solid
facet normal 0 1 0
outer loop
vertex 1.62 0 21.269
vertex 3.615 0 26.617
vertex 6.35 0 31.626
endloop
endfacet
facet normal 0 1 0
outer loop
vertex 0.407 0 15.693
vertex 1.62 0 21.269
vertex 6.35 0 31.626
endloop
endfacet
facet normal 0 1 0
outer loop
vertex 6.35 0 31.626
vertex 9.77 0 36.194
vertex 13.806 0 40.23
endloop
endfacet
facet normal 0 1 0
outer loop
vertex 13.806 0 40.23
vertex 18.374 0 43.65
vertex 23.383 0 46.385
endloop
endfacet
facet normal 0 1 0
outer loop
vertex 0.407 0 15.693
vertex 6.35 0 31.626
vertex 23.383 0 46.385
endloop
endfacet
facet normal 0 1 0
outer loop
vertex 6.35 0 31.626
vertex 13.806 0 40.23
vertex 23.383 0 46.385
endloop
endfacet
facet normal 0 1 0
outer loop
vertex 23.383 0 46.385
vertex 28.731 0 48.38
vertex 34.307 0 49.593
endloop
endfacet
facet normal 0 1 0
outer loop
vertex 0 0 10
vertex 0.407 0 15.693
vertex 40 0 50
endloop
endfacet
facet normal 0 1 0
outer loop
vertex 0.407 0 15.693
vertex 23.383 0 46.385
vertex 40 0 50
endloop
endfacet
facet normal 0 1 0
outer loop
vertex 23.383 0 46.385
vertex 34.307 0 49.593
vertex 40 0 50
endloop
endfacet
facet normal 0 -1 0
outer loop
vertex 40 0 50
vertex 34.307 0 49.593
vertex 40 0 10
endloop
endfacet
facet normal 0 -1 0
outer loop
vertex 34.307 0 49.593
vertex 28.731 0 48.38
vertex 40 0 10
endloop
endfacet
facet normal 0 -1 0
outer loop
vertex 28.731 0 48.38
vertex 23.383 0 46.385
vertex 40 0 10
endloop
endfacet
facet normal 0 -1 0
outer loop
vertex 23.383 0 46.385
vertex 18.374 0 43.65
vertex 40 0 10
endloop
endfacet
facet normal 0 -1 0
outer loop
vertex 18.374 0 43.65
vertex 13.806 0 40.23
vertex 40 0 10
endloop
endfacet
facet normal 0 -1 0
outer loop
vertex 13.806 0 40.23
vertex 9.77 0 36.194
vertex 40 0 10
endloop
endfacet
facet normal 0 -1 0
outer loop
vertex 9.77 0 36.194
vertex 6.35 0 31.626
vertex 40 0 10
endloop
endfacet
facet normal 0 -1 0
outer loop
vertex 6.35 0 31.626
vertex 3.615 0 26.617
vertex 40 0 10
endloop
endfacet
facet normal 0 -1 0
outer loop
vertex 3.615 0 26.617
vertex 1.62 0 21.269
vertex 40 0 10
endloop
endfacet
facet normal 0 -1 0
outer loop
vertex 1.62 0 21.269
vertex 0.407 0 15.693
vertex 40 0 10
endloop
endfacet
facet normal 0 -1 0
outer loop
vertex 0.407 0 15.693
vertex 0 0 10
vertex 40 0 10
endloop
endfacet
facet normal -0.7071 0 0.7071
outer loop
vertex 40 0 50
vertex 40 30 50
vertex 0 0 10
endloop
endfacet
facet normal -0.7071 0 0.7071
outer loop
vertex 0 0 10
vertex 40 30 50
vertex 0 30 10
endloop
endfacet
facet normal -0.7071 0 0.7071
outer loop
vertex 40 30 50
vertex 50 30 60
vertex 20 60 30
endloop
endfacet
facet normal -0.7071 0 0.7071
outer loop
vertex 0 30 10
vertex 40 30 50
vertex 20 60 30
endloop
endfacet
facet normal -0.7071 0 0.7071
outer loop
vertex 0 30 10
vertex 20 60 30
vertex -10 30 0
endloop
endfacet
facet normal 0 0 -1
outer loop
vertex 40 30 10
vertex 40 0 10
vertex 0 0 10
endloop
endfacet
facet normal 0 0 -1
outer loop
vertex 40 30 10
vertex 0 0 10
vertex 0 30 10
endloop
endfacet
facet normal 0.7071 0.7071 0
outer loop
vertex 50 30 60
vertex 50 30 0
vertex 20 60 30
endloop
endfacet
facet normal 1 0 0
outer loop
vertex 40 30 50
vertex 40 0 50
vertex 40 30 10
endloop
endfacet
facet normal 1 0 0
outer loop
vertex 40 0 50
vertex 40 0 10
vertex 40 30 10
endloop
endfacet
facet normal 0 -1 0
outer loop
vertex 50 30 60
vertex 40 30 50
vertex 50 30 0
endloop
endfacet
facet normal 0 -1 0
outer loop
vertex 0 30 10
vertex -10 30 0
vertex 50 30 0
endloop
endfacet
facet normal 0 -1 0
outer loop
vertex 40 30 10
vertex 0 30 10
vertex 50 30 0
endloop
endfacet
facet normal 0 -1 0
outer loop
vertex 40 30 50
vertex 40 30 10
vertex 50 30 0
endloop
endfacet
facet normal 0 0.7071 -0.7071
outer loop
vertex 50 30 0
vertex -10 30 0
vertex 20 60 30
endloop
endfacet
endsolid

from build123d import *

# Parameters (mm, degrees)
SKETCH1_W           = 40
SKETCH1_H           = 30
BOSS_EXTRUDE2_DEPTH = 60
SKETCH3_W           = 10
SKETCH3_H           = 30
CUT_EXTRUDE1_DEPTH  = 60
CUT_EXTRUDE2_DEPTH  = 60
CUT_EXTRUDE3_DEPTH  = 60
CUT_EXTRUDE4_DEPTH  = 60
BOSS_EXTRUDE7_DEPTH = 0.0001


with BuildPart() as part:
    # Sketch1 → Boss-Extrude2 (new body)
    with BuildSketch(Plane.XY):
        Polygon((50, 30), (20, 60), (-10, 30), (0, 30), (40, 30), align=None)
        with Locations((20, 15)):
            Rectangle(SKETCH1_W, SKETCH1_H)
    extrude(amount=BOSS_EXTRUDE2_DEPTH)

    # Sketch3 → Cut-Extrude1 (cut)
    with BuildSketch(Plane(origin=(0, 0, 0), x_dir=(0, 0, -1), z_dir=(1, 0, 0))):
        Polygon((-30, 60), (0, 60), (0, 30), align=None)
        Polygon((-60, 30), (-60, 60), (-30, 60), align=None)
        with Locations((-5, 15)):
            Rectangle(SKETCH3_W, SKETCH3_H)
        with Locations((-55, 15)):
            Rectangle(SKETCH3_W, SKETCH3_H)
    extrude(amount=CUT_EXTRUDE1_DEPTH, mode=Mode.SUBTRACT)

    # Sketch4 → Cut-Extrude2 (cut)
    with BuildSketch(Plane(origin=(0, 0, 0), x_dir=(0, 0, -1), z_dir=(1, 0, 0))):
        Polygon((-60, 30), (-50, 40), (-60, 40), align=None)
    extrude(amount=-CUT_EXTRUDE2_DEPTH, mode=Mode.SUBTRACT)

    # Sketch5 → Cut-Extrude3 (cut)
    with BuildSketch(Plane(origin=(0, 0, 0), x_dir=(0, 0, -1), z_dir=(1, 0, 0))):
        Polygon((-10, 40), (0, 40), (0, 30), align=None)
    extrude(amount=-CUT_EXTRUDE3_DEPTH, mode=Mode.SUBTRACT)

    # Sketch6 → Cut-Extrude4 (cut)
    with BuildSketch(Plane(origin=(0, 60, 0), x_dir=(1, 0, 0), z_dir=(0, 1, 0))):
        Polygon((-10, 0), (-10, -60), (50, -60), align=None)
    extrude(amount=-CUT_EXTRUDE4_DEPTH, mode=Mode.SUBTRACT)

    # Sketch7 → Boss-Extrude7 (add)
    with BuildSketch(Plane.XZ):
        with BuildLine():
            Line((0, 10), (40, 10))
            Line((40, 10), (40, 50))
            ThreePointArc((40, 50), (11.715728753, 38.284271247), (0, 10))
        make_face()
    extrude(amount=-BOSS_EXTRUDE7_DEPTH)


solid = part.part
